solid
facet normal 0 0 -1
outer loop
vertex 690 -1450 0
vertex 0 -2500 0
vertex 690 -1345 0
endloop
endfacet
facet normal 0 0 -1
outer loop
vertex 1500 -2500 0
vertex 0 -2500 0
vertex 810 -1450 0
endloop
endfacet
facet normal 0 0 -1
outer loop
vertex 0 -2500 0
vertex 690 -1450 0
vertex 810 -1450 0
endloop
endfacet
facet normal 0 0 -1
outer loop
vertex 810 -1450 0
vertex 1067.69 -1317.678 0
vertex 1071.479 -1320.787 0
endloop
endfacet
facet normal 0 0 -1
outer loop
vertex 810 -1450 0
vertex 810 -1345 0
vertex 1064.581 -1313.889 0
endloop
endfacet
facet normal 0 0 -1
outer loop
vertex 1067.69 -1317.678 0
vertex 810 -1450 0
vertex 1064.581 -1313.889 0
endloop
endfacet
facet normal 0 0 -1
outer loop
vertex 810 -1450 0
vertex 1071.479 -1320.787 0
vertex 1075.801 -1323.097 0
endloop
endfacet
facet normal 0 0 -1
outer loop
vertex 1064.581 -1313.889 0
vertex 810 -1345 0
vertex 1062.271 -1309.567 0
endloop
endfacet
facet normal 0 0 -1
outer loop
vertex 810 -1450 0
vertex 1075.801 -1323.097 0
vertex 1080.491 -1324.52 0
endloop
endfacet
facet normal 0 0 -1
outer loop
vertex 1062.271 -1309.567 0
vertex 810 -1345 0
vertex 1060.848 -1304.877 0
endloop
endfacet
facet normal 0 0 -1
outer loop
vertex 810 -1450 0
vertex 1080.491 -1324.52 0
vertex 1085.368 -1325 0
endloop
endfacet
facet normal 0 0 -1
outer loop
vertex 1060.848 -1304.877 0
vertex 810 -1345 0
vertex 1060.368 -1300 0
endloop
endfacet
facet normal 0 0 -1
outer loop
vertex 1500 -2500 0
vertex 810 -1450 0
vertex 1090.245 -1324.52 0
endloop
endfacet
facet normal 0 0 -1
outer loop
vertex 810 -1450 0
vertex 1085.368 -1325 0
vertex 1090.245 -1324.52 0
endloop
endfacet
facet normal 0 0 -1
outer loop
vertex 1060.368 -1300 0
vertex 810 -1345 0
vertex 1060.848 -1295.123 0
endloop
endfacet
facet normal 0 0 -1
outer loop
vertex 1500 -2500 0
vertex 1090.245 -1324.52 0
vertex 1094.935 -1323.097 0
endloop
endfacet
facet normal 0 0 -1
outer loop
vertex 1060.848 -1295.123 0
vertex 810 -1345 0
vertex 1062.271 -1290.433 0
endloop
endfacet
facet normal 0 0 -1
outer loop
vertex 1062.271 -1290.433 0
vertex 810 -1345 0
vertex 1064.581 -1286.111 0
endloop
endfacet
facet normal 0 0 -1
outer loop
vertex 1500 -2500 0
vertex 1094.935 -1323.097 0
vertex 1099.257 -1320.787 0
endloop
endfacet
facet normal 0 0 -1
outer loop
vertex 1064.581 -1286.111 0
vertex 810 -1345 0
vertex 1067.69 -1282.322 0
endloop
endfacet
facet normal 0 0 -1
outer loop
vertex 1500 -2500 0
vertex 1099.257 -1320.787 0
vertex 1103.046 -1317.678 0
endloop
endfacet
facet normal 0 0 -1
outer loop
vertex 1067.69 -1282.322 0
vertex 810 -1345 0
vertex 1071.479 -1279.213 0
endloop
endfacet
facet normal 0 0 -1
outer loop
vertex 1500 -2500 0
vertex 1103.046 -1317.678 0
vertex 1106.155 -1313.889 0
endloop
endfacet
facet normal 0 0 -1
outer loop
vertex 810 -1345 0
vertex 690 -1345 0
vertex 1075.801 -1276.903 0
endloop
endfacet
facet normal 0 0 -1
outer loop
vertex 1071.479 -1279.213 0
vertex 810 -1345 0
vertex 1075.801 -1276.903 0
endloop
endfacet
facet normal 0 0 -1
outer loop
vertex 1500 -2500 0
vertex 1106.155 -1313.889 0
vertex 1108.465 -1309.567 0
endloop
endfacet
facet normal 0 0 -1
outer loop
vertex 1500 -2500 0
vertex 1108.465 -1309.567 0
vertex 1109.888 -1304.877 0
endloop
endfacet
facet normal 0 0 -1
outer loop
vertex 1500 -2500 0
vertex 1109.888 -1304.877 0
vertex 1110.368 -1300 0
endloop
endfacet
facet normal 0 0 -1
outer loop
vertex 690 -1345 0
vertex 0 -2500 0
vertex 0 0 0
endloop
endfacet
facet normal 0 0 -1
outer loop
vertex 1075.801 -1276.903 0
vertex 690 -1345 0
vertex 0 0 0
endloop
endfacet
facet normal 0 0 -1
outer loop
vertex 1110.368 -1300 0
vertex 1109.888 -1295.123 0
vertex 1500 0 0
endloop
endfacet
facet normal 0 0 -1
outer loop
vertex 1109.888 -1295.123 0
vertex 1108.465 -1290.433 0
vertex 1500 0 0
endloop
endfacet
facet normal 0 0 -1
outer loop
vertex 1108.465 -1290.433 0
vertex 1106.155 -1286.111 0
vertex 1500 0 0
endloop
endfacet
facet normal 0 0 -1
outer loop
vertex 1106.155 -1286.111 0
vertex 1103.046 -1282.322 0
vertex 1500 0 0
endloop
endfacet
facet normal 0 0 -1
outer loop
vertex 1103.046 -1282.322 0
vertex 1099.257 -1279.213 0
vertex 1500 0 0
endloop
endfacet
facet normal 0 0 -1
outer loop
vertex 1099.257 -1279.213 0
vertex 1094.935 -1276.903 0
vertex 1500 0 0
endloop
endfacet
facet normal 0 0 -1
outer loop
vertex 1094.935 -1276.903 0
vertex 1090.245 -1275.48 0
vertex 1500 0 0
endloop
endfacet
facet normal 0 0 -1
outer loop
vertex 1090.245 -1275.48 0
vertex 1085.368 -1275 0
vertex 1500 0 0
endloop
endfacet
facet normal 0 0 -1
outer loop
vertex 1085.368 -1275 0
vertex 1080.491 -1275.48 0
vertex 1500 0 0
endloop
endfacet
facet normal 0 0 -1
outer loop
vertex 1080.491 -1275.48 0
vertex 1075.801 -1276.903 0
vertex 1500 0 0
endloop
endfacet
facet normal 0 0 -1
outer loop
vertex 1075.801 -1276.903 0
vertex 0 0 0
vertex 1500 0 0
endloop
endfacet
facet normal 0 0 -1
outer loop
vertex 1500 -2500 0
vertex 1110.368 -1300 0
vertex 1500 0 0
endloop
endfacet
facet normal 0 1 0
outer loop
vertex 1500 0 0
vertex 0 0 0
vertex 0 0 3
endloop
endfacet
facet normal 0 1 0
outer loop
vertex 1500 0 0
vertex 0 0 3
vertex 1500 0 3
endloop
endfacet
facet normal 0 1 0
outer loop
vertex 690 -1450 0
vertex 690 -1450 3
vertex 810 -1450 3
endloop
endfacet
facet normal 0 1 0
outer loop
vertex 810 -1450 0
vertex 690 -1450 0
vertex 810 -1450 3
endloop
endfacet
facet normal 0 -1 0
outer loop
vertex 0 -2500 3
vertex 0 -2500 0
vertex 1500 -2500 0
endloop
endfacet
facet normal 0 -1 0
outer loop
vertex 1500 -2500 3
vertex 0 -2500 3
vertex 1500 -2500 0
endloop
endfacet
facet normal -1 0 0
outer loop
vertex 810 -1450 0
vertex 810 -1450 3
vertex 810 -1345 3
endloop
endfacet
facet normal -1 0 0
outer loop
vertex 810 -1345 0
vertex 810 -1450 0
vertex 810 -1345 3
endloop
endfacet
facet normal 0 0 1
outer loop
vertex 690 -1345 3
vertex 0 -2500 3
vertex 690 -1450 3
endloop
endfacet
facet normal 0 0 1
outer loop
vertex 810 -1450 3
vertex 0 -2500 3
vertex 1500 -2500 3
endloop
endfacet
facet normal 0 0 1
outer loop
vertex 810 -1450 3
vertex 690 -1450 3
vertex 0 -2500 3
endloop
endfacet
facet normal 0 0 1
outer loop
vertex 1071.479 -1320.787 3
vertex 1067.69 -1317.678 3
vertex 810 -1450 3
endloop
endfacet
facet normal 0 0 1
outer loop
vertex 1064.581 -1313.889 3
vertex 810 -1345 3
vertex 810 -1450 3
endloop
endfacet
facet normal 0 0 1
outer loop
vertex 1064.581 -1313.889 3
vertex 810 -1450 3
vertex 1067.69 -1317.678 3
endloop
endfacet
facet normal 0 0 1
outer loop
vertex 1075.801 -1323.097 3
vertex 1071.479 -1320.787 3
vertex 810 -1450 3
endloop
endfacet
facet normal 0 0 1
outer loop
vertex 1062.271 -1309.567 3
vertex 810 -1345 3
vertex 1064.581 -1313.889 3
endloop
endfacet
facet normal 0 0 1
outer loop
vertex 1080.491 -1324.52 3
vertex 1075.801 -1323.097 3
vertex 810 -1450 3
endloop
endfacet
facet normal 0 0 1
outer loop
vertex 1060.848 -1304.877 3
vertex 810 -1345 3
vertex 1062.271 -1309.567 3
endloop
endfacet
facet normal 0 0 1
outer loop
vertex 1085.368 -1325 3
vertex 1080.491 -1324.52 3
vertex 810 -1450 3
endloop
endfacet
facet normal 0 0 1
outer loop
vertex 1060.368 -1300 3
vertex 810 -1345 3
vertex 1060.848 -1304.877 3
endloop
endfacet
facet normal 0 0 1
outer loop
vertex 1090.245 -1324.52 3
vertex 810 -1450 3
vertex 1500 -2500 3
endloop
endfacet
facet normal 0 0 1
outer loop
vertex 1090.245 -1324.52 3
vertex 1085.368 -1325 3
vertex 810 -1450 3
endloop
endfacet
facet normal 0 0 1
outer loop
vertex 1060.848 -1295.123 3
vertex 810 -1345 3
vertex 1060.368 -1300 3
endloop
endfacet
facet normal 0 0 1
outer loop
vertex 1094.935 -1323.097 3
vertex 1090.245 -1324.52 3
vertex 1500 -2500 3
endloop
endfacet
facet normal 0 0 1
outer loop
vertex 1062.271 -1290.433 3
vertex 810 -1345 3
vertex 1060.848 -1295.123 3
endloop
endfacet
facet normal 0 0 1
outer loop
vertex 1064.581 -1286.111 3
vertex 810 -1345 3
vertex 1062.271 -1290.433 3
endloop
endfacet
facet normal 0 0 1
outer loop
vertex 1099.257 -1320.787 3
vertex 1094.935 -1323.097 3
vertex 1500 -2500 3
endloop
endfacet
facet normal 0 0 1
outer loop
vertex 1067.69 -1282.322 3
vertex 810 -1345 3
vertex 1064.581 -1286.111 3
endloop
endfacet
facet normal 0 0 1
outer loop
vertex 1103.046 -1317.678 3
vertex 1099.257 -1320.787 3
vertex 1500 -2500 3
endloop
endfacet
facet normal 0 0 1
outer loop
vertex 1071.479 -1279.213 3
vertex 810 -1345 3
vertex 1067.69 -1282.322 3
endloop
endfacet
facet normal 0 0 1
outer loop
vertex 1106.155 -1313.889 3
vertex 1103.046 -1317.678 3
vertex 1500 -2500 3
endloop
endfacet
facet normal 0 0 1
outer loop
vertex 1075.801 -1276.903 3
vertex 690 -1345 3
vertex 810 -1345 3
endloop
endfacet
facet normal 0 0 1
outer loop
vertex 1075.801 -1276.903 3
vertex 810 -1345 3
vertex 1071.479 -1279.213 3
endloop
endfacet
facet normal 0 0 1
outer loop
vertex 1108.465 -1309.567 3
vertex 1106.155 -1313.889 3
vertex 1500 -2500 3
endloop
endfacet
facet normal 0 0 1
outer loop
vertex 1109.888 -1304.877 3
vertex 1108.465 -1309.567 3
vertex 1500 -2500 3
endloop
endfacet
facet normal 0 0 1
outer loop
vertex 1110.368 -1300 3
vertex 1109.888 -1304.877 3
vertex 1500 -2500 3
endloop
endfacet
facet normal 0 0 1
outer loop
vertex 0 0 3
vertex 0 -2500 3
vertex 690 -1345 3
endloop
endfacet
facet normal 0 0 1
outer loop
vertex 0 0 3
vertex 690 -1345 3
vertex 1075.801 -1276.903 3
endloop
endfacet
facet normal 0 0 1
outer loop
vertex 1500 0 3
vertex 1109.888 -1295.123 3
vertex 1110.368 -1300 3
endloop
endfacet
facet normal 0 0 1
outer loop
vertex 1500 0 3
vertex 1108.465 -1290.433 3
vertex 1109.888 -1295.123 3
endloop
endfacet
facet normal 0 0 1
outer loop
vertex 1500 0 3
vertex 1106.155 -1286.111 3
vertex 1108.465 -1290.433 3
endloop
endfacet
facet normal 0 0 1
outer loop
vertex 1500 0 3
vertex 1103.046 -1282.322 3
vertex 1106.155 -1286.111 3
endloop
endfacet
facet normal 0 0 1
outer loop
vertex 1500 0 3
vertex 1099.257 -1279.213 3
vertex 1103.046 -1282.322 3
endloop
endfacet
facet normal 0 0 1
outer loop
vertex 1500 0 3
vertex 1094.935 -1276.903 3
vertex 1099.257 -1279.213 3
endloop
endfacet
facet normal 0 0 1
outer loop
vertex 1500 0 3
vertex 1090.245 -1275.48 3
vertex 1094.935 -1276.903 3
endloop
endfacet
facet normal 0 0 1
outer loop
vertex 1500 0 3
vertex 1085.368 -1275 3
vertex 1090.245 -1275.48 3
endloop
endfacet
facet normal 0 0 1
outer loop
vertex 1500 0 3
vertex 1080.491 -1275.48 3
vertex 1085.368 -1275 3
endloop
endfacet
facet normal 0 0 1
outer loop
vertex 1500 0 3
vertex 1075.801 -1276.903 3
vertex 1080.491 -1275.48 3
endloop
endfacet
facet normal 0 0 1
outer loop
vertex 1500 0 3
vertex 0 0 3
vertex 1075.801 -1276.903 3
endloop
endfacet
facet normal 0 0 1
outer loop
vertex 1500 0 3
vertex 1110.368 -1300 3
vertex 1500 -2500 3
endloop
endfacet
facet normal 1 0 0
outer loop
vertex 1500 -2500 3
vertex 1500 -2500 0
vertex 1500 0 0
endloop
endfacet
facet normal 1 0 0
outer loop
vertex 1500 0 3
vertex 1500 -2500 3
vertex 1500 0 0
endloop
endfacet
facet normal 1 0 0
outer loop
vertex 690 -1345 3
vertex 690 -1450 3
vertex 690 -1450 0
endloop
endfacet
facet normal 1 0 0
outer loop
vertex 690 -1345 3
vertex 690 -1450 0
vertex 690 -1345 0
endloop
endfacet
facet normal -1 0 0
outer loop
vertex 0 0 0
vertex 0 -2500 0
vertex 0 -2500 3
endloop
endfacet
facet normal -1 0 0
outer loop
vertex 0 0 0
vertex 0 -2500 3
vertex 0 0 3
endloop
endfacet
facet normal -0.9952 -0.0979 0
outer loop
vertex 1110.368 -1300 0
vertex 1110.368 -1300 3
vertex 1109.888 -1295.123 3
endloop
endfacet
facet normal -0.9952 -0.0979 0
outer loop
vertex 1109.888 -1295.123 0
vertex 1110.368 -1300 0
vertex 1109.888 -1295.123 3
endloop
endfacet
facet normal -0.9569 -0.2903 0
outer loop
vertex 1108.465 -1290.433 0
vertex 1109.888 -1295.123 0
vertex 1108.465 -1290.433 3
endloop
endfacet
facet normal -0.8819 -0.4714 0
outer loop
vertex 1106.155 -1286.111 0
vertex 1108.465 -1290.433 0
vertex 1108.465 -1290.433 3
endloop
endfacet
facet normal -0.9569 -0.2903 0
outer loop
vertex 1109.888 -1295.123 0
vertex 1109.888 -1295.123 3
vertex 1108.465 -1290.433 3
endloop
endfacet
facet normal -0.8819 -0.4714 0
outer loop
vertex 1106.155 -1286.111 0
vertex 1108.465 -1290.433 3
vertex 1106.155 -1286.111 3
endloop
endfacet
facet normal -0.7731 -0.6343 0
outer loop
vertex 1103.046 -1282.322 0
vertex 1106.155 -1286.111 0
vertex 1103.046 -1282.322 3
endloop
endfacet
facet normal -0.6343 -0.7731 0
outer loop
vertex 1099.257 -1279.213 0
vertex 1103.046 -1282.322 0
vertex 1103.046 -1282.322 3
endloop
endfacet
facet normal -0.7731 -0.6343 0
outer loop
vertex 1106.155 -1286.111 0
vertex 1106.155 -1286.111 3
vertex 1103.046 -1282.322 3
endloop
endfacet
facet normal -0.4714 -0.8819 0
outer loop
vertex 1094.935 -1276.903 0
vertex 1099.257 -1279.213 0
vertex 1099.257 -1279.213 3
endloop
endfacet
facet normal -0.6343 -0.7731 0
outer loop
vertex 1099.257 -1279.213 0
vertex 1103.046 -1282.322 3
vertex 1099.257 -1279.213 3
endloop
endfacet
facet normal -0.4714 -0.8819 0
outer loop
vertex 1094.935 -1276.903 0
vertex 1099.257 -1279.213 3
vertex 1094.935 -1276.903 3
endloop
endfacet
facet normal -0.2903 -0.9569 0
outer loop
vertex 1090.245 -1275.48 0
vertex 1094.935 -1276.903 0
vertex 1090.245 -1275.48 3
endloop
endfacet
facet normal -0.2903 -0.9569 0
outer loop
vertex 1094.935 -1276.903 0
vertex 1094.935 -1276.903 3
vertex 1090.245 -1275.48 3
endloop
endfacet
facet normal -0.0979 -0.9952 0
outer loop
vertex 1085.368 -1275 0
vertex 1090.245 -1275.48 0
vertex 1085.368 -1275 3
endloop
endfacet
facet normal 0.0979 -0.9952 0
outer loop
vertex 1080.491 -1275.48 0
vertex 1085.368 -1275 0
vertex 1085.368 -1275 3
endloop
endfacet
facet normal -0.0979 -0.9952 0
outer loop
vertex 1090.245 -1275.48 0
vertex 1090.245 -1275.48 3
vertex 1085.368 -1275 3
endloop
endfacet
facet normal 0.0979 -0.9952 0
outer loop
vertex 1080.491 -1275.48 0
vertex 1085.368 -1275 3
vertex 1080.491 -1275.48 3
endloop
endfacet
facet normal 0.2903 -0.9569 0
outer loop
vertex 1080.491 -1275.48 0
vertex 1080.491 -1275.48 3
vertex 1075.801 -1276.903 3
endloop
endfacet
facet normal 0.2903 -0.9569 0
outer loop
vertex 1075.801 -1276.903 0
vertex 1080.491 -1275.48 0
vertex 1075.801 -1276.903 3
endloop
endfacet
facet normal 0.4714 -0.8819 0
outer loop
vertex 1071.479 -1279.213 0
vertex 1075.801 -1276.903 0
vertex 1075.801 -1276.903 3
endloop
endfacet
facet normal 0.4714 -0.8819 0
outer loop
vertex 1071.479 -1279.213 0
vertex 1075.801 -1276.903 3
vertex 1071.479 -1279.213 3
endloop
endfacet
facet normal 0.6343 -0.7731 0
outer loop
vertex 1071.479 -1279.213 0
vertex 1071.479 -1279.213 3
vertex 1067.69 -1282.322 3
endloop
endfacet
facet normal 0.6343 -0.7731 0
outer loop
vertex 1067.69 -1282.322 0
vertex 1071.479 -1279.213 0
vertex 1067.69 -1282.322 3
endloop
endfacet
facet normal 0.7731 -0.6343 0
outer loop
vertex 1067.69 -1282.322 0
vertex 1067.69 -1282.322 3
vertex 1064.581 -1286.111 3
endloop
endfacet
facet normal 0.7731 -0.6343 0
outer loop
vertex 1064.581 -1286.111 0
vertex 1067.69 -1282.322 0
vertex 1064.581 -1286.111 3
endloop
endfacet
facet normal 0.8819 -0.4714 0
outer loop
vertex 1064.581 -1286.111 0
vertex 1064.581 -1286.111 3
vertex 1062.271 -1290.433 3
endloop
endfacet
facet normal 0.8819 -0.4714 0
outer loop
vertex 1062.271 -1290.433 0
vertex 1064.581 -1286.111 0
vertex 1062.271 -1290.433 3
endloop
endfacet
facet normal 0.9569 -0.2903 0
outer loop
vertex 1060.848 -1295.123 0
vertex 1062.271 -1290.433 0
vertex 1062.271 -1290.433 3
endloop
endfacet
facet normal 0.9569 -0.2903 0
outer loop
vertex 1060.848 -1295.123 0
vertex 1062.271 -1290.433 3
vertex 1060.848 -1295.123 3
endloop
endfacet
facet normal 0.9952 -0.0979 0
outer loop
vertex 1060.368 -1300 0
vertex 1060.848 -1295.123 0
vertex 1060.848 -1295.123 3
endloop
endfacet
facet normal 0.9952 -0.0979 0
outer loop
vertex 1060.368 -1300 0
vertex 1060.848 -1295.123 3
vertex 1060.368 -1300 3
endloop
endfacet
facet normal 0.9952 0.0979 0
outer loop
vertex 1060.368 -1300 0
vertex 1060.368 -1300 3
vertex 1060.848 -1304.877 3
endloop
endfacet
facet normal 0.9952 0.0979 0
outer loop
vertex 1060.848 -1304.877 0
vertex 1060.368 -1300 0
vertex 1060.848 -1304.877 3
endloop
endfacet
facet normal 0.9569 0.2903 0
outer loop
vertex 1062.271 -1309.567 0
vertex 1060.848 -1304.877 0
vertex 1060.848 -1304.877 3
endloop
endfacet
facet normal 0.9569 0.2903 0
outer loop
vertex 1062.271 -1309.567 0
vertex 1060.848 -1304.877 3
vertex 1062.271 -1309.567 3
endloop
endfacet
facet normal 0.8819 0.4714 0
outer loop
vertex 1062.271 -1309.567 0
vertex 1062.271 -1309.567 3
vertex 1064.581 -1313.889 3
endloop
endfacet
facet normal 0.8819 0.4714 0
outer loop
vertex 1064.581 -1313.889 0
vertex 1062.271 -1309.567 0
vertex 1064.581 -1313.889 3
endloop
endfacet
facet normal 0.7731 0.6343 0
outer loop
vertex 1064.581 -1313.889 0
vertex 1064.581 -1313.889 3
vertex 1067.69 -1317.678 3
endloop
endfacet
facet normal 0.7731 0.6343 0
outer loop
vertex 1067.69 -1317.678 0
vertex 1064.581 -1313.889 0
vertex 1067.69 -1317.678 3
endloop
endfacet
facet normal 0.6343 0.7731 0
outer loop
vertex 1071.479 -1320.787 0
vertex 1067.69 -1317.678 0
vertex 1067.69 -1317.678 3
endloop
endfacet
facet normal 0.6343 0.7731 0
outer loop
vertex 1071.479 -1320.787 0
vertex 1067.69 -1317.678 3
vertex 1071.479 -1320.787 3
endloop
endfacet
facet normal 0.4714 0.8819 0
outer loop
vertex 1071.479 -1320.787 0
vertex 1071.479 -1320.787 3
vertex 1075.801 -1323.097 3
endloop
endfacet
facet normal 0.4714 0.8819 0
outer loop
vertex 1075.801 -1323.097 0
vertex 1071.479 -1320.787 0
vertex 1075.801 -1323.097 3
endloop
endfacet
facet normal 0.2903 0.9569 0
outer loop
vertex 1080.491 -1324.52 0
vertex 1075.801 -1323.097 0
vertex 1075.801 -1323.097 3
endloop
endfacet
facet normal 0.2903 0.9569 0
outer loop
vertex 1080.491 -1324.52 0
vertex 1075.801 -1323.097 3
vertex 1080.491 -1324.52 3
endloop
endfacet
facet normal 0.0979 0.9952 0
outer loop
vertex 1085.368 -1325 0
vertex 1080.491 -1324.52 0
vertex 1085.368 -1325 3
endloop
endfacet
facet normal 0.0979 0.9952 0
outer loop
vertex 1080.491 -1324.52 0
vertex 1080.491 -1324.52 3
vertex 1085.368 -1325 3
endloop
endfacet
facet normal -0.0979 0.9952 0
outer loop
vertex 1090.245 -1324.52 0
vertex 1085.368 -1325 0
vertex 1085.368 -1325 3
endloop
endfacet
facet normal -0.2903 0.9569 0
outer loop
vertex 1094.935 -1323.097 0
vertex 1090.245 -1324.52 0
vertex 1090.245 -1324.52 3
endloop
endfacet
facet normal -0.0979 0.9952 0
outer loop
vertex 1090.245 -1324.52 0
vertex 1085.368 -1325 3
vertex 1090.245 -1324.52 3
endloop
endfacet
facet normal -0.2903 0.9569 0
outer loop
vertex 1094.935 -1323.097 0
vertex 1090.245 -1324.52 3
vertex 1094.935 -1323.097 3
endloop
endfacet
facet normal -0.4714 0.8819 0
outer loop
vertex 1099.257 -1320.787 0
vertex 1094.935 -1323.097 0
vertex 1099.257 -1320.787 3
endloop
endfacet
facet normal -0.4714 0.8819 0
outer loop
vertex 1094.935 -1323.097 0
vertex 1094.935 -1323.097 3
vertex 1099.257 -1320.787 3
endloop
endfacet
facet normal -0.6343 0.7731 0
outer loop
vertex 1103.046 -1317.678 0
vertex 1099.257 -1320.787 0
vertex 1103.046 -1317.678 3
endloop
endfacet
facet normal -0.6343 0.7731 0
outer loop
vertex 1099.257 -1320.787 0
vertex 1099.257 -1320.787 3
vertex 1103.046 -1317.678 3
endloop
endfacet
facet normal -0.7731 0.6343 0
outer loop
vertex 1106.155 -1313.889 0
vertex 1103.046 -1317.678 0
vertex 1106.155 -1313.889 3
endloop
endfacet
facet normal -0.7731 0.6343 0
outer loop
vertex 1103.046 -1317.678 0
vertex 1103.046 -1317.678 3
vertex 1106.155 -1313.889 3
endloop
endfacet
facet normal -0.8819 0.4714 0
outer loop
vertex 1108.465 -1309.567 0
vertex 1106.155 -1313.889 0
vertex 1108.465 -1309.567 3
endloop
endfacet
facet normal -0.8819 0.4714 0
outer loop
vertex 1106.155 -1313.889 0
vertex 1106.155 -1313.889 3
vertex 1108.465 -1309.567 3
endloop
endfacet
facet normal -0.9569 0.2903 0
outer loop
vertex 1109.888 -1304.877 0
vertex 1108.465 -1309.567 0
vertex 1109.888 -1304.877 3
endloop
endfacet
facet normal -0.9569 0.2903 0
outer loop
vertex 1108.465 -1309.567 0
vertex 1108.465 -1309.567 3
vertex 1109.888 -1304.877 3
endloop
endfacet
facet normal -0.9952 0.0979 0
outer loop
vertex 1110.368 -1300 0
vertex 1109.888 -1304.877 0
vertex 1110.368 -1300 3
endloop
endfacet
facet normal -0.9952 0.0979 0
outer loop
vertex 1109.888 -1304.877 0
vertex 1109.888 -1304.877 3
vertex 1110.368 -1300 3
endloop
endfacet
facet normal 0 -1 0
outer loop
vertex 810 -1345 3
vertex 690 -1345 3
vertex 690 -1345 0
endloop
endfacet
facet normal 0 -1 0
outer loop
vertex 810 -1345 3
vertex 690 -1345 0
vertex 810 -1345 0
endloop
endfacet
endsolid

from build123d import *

# Parameters (mm, degrees)
SKETCH_1_W          = 1500
SKETCH_1_H          = 2500
EXTRUDE_1_DEPTH     = 3
SKETCH_3_W          = 120
SKETCH_3_H          = 105
CUT_EXTRUDE_2_DEPTH = 2916.47749091
SKETCH_4_R          = 25
CUT_EXTRUDE_3_DEPTH = 300


with BuildPart() as part:
    # 草圖1 → 填料-伸長1 (new body)
    with BuildSketch(Plane.XY):
        with Locations((750, -1250)):
            Rectangle(SKETCH_1_W, SKETCH_1_H)
    extrude(amount=EXTRUDE_1_DEPTH)

    # 草圖3 → 除料-伸長2 (cut, through all)
    with BuildSketch(Plane.XY.offset(3)):
        with Locations((750, -1397.5)):
            Rectangle(SKETCH_3_W, SKETCH_3_H)
    extrude(amount=-CUT_EXTRUDE_2_DEPTH, mode=Mode.SUBTRACT)

    # 草圖4 → 除料-伸長3 (cut)
    with BuildSketch(Plane.XY.offset(3)):
        with Locations((1085.367901205, -1300)):
            Circle(SKETCH_4_R)
    extrude(amount=-CUT_EXTRUDE_3_DEPTH, mode=Mode.SUBTRACT)


solid = part.part
